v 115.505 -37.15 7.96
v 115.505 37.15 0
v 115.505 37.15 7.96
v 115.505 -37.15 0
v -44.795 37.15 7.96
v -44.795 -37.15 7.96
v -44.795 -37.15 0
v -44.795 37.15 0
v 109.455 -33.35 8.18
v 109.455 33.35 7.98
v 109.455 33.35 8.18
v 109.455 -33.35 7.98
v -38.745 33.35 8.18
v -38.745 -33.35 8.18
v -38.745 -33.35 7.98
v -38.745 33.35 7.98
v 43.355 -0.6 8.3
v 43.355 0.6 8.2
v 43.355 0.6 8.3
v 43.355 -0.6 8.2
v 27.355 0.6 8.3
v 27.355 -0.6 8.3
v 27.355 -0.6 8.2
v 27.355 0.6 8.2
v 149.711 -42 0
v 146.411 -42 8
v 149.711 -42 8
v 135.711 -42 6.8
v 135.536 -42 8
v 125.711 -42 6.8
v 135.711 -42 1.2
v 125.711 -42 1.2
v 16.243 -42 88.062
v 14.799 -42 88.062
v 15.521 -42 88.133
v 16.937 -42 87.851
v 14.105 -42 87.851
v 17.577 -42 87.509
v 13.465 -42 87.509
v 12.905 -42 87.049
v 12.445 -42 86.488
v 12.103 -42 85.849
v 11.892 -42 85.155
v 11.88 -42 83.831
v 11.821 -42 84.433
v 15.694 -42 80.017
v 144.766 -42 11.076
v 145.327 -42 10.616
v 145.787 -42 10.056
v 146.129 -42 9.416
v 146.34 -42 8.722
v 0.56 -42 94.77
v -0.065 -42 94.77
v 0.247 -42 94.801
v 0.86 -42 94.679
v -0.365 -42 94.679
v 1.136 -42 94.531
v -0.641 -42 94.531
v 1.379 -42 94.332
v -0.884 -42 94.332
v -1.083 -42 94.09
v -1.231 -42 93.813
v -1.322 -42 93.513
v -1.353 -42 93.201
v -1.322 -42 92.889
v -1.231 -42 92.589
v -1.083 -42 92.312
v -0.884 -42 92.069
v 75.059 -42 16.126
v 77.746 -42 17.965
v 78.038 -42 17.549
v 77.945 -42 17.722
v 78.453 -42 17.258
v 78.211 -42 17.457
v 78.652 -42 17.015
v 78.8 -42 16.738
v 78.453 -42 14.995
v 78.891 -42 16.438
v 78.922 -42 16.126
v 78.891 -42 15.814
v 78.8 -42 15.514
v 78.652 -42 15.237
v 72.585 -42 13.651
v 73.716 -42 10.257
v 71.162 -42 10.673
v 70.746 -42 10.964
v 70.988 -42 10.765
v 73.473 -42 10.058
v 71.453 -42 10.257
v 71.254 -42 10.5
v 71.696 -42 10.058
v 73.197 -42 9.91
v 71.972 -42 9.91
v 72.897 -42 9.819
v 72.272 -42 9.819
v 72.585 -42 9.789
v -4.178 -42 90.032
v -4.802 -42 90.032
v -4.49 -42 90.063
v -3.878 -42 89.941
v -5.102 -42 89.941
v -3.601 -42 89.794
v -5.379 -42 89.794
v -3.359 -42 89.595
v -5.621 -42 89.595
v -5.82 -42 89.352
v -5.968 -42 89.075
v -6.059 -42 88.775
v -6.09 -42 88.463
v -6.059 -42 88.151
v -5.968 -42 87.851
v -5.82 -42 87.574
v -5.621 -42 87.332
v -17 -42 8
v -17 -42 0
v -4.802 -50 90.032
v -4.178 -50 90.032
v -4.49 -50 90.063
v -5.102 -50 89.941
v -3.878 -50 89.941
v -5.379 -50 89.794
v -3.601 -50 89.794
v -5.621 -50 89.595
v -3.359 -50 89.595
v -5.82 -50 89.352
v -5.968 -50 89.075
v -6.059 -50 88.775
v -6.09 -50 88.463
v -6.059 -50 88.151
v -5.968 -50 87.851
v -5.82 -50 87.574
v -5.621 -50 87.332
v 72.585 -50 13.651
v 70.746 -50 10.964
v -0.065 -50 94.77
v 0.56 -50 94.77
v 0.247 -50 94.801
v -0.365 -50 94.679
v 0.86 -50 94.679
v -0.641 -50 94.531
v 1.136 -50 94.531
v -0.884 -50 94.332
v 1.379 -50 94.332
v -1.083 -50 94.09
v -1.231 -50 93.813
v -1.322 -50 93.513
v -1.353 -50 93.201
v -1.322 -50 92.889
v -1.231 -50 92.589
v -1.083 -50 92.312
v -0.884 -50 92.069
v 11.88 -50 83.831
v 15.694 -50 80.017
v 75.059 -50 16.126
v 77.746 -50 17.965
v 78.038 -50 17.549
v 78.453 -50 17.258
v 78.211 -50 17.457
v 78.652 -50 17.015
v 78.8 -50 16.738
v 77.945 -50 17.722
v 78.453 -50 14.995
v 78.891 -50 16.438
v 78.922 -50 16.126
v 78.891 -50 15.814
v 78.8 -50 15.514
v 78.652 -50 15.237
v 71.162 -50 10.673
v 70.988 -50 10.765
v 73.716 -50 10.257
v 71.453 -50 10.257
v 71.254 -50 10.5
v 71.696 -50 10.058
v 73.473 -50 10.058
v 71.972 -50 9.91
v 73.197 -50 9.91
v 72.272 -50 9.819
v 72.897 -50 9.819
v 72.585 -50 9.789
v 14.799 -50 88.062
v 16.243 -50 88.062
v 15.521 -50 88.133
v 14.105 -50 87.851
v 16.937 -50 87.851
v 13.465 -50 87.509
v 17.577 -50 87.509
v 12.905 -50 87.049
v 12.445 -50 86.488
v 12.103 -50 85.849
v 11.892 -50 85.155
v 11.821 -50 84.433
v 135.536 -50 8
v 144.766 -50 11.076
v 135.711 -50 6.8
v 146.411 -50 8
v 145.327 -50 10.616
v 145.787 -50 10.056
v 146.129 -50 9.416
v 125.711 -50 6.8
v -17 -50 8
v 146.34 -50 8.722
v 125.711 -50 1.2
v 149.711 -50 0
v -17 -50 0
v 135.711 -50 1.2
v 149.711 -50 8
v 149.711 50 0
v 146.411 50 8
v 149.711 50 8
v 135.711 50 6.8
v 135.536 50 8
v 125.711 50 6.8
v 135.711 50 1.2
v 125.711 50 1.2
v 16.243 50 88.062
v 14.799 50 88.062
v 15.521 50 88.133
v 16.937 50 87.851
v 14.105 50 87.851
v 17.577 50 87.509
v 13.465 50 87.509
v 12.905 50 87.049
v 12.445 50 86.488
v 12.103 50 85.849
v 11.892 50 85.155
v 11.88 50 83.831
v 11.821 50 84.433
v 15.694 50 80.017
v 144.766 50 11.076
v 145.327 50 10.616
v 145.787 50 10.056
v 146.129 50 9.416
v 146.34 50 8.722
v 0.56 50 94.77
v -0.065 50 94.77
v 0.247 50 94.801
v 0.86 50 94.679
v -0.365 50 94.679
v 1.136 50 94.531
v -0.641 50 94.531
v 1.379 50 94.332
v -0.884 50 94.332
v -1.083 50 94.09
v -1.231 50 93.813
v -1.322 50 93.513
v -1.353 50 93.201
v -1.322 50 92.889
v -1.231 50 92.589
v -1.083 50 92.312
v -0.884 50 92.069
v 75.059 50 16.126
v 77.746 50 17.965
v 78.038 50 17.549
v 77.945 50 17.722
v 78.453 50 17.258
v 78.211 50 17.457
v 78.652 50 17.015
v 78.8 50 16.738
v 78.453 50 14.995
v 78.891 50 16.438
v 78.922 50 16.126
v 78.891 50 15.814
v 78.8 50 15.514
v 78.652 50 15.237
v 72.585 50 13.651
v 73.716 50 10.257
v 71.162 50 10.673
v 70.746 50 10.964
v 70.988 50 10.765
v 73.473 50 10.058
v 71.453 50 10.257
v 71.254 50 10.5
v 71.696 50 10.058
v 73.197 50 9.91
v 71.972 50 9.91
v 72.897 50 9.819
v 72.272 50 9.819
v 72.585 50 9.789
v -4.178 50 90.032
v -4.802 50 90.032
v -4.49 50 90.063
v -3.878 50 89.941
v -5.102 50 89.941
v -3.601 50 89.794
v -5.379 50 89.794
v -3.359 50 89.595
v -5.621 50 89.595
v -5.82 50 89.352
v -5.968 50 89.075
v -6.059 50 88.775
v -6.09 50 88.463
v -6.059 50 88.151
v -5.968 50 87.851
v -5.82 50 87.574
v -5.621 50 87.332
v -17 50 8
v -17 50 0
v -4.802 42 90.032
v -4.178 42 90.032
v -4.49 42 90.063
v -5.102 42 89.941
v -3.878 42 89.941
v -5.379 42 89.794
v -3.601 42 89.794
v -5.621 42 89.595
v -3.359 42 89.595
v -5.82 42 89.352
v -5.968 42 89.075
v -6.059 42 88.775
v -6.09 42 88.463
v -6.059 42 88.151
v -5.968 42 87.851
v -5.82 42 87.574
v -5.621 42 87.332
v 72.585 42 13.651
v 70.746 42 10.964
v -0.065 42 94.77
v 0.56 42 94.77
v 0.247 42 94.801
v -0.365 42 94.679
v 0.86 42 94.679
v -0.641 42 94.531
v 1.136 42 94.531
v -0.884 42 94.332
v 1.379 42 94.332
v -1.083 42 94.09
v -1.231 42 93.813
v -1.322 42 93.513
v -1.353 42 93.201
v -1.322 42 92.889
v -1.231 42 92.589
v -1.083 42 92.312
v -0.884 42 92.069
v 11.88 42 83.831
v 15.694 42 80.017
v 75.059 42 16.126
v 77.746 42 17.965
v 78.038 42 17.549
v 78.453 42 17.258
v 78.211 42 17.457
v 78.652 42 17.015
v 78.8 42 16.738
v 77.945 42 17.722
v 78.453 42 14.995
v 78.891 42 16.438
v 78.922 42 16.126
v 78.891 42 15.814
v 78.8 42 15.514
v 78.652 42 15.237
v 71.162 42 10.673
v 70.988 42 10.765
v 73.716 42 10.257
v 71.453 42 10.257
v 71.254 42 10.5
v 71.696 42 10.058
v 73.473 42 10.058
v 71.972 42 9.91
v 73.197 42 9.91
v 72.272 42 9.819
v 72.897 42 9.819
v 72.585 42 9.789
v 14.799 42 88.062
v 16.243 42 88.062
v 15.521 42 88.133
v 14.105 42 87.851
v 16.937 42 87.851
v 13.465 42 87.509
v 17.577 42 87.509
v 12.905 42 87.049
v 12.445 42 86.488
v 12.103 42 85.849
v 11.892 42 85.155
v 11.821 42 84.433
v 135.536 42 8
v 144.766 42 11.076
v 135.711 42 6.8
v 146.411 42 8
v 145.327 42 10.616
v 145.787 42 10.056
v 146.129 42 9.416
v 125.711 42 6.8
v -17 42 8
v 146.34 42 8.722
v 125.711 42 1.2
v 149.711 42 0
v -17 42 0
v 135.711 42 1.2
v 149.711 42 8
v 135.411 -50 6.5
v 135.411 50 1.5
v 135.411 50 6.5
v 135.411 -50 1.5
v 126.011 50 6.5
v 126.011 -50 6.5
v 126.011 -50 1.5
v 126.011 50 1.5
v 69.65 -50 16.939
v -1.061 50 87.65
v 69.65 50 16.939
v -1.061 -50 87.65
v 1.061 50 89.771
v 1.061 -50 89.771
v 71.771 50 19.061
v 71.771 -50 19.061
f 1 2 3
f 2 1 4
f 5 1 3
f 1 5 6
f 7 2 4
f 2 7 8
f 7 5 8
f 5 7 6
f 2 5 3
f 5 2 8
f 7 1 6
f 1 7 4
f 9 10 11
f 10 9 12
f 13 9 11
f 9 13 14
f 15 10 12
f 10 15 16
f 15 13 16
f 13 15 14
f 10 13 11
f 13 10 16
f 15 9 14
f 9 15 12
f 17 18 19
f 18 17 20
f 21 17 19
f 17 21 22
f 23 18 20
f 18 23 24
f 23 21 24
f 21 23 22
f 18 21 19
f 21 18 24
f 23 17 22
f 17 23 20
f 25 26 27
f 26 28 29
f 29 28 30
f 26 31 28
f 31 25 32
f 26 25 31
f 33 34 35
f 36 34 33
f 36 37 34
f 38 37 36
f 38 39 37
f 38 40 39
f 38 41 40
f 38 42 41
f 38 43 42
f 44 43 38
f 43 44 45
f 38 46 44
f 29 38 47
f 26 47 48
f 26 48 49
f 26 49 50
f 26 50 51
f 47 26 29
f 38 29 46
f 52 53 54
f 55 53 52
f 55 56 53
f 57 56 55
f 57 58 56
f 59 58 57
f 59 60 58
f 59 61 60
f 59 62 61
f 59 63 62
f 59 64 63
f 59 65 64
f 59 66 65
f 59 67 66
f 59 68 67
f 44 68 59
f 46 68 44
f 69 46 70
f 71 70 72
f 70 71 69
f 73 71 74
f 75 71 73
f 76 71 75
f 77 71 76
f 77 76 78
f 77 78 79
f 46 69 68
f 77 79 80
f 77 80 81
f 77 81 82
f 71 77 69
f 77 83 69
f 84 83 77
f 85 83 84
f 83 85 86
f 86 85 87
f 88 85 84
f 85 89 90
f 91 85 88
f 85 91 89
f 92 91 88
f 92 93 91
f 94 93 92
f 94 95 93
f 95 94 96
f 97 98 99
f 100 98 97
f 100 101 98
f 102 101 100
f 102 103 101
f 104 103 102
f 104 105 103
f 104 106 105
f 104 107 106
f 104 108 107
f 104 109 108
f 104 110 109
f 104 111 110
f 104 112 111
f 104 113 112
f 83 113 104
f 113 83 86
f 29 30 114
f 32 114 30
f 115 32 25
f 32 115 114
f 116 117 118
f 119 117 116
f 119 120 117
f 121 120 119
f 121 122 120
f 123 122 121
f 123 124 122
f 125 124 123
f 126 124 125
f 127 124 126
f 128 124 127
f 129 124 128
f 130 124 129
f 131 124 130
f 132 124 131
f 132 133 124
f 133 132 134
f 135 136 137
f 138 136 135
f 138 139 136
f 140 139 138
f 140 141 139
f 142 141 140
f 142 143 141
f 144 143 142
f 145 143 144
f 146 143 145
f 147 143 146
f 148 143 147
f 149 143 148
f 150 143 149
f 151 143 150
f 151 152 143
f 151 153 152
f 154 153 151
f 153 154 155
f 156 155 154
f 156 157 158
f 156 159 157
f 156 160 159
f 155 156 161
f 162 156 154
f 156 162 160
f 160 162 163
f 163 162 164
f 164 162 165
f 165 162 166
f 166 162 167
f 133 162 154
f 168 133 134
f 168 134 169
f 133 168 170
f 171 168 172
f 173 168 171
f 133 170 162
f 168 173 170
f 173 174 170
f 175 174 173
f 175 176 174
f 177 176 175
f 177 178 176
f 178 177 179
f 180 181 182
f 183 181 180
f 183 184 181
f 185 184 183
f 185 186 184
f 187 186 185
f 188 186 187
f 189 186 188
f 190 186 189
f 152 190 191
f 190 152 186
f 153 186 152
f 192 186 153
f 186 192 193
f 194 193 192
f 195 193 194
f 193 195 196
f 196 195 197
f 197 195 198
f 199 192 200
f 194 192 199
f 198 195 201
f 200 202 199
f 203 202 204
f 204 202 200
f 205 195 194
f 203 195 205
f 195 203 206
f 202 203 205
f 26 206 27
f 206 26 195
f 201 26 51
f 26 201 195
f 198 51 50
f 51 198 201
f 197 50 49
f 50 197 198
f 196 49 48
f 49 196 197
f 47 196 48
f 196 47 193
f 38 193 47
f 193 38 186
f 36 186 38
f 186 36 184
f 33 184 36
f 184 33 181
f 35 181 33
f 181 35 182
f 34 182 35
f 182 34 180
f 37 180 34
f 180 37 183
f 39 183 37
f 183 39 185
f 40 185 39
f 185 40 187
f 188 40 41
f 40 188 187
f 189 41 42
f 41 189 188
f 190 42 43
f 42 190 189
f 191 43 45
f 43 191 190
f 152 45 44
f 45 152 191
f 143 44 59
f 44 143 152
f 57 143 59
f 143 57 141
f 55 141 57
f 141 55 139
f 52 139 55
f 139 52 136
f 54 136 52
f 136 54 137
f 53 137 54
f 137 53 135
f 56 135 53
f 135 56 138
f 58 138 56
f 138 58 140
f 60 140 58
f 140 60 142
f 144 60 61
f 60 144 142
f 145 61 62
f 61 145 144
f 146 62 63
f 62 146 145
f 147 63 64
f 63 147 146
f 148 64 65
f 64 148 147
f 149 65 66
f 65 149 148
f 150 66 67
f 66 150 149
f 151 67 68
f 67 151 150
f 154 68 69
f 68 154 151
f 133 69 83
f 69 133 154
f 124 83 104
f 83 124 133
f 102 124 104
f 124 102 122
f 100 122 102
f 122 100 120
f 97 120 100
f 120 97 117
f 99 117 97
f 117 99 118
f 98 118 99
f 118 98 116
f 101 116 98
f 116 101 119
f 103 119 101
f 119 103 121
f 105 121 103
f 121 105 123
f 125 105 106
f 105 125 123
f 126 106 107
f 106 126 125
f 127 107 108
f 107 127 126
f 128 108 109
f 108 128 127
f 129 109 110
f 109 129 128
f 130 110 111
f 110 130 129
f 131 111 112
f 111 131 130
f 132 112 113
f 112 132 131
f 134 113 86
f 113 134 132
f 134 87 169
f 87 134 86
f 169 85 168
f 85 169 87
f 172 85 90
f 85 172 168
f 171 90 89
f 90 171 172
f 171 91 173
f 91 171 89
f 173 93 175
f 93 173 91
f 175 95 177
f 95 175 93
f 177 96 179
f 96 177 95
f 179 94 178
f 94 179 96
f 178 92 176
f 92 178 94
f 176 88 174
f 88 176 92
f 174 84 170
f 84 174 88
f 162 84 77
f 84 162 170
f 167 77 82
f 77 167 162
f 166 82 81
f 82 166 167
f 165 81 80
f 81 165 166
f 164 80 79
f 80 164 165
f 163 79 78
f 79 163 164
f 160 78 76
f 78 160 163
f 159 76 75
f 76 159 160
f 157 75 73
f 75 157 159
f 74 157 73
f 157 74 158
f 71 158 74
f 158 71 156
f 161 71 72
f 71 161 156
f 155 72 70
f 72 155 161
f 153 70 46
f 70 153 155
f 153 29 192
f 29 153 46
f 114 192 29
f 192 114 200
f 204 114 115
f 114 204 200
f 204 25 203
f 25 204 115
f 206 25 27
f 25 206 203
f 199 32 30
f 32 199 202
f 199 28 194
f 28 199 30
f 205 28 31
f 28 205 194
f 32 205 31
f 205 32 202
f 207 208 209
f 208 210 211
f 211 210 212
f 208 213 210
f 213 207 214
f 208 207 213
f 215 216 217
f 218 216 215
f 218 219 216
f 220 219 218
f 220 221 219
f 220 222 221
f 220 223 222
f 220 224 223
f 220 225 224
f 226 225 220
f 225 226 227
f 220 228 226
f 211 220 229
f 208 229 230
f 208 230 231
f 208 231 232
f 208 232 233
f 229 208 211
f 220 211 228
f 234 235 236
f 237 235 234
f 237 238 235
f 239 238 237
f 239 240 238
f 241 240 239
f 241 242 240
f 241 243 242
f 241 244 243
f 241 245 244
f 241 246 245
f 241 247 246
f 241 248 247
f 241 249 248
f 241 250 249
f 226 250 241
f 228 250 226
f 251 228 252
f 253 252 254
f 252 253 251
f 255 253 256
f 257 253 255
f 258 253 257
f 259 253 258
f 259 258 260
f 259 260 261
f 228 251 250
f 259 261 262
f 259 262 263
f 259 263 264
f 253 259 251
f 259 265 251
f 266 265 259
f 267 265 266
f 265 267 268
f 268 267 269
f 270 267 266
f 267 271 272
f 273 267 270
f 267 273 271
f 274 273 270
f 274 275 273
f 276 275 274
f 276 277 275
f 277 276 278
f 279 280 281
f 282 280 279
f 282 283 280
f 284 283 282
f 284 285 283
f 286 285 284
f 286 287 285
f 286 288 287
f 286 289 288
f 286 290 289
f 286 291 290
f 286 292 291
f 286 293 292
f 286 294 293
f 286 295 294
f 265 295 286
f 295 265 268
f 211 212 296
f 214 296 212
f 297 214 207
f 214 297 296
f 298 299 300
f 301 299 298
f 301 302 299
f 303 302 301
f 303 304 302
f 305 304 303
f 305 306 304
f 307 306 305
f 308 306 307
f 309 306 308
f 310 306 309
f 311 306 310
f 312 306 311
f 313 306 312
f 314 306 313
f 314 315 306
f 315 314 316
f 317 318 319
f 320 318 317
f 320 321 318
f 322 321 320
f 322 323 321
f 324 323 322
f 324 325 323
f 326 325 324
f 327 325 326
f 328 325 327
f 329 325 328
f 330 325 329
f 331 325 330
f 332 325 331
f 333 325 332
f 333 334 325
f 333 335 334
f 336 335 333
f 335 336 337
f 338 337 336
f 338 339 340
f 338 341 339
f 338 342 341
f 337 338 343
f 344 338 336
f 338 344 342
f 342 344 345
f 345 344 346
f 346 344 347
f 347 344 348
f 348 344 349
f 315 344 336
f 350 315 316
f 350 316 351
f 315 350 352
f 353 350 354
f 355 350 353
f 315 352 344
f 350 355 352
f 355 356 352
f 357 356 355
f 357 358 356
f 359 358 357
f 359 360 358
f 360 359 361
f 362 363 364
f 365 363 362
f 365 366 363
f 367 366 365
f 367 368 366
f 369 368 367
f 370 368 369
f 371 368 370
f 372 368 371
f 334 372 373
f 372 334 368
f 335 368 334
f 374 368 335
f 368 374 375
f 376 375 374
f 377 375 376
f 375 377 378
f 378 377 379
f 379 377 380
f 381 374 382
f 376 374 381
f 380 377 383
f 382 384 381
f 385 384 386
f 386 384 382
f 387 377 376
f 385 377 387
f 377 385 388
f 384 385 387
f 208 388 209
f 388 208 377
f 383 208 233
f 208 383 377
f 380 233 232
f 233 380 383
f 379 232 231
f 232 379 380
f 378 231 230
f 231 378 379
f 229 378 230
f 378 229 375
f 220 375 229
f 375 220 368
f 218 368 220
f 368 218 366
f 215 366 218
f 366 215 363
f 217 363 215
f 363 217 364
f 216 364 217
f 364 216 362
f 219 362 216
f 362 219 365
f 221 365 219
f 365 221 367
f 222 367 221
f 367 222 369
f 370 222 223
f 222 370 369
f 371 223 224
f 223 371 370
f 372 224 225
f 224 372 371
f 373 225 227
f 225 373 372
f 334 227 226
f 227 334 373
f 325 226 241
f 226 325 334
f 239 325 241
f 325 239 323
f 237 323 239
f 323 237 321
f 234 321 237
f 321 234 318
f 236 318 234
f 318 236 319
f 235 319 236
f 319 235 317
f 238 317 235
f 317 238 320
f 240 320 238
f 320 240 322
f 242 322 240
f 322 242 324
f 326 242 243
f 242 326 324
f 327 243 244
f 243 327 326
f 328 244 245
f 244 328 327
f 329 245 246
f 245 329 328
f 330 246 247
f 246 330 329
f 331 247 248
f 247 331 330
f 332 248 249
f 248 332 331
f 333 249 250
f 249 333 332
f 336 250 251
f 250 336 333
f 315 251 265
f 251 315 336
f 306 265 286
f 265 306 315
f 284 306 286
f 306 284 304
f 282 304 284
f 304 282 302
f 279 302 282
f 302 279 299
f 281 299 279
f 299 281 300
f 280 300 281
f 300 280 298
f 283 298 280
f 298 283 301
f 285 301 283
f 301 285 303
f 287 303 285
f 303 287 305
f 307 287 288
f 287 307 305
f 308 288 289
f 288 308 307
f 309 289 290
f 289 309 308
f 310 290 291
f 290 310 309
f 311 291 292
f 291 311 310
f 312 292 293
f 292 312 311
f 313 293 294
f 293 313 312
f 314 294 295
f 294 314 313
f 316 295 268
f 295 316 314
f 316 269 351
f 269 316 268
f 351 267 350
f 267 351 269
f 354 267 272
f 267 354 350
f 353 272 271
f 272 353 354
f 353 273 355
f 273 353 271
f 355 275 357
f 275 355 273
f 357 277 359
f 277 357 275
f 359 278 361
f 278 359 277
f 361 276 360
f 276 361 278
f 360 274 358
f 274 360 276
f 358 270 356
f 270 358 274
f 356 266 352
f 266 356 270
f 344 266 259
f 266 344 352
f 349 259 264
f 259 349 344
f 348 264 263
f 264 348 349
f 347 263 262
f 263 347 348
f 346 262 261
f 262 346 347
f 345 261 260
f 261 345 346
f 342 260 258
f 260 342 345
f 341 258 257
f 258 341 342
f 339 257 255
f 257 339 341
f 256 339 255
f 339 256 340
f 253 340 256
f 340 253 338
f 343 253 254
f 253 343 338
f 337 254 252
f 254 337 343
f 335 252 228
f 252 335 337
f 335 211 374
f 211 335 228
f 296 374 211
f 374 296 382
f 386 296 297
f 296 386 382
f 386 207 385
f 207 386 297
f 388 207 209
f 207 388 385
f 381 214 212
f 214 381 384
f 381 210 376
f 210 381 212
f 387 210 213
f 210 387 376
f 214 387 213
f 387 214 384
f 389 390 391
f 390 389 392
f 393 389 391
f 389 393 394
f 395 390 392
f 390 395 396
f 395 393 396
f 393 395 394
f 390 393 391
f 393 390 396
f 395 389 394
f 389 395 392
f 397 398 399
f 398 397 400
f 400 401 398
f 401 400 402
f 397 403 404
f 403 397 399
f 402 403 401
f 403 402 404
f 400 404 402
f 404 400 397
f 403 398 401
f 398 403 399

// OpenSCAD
/*
  HOLODESK Reno3 V0.2 — single 45-degree plate desktop optical MVP
  Units: mm. Parametric for 100x100 or 150x150 acrylic sheet.

  PRINTING:
  mode="print_bracket" -> print two matching brackets.
  mode="print_bar" -> print one crossbar.
  In assembly mode the sheet and Reno3 are for visualization only.
  Smartphone rests on the table, NOT in a clamping cradle.
  Changes from V0.1: 10 mm -> 18 mm plate lower-edge height;
  accurate Reno3 Vitality physical envelope and approximate 20:9 screen.
*/
mode = "assembly";       // "assembly", "print_bracket", "print_bar", "print_layout"
panel_size = 100;         // 100 or 150
panel_thickness = 3;     // adjust to actually measured material
slot_clearance = 0.5;    // total additional slot width, tune for printer
view_angle = 45;         // degrees from tabletop
plate_bottom_z = 18;     // V0.2 extra safety clearance above phone
show_phone = true;
show_plate = true;
phone_length = 160.3;    // OPPO Reno3 Vitality (元气版)
phone_width = 74.3;
phone_thickness = 7.96; // bare phone; add an actual measured case height if using case
phone_extra_height = 0;  // measured case/standoff contribution, if any
$fn=32;

// Shape dimensions. The phone is not supported by the frame.
slot = panel_thickness + slot_clearance;
wall = 3.2;
foot_height = 8;
foot_front = 17;
foot_back = 79;
bracket_width = 8;
rad=view_angle;
c=cos(rad);
s=sin(rad);
B=[panel_size*c,plate_bottom_z];
T=[0,plate_bottom_z+panel_size*s];
v=[-c,s];
n=[s,c];
bar_x=B[0]+55;
bar_hole_w=10;
bar_hole_z=1.2;
bar_hole_h=5.6;

// Physical checks are indicative; real-world print tolerances and camera bumps apply.
echo(str("Reno3 body ",phone_length," x ",phone_width," x ",phone_thickness," mm"));
echo(str("Estimated minimum plate-surface-to-phone-top gap: ", plate_bottom_z-panel_thickness/2*cos(view_angle)-(phone_thickness+phone_extra_height)," mm"));
echo(str("Lateral phone-to-bracket total free gap: ",panel_size-2*bracket_width-phone_width," mm"));

function add(a,b)=[a[0]+b[0],a[1]+b[1]];
function scale2(a,vv)=[a[0]*vv,a[1]*vv];
function shift(a,vector,length)=add(a,scale2(vector,length));
module capsule(a,b,r){hull(){translate(a)circle(r=r);translate(b)circle(r=r);}}
module bracket_profile(){
  difference(){
    union(){
      translate([-foot_front,0]) square([B[0]+foot_back+foot_front,foot_height]);
      for(side=[-1,1])
        capsule(shift(shift(B,v,-5),n,side*(slot/2+wall/2)),
                shift(shift(T,v, 3),n,side*(slot/2+wall/2)),wall/2);
      capsule(shift(shift(B,v,-6),n,-(slot/2+wall/2)),
              shift(shift(B,v,-6),n, (slot/2+wall/2)),wall/2);
      capsule(shift(shift(T,v,-14),n,slot/2+wall+3),
              [B[0]+foot_back-7,foot_height],3.7);
    }
    translate([bar_x,bar_hole_z])square([bar_hole_w,bar_hole_h]);
  }
}
module bracket_flat(){linear_extrude(height=bracket_width) bracket_profile();}
module bar_flat(){cube([9.4,panel_size,5.0]);}
module bracket_assembled(y_top){translate([0,y_top,0])rotate([90,0,0])bracket_flat();}
module bar_assembled(){translate([bar_x+0.3,-panel_size/2,1.5])bar_flat();}
module plate_assembled(){
  color([0.35,0.8,0.92,0.28])
    translate([B[0],-panel_size/2,plate_bottom_z])
      rotate([0,-(180-view_angle),0])
        translate([0,0,-panel_thickness/2])
          cube([panel_size,panel_size,panel_thickness]);
}
module phone_assembled(){
  // Black phone envelope; camera bump/case not modeled.
  cx=B[0]/2;
  color([0.12,0.13,0.15])
    translate([cx-phone_length/2,-phone_width/2,0])
      cube([phone_length,phone_width,phone_thickness+phone_extra_height]);
  // Approximate OLED active display dimensions from 6.4-inch, 20:9 spec.
  screen_long=148.2;
  screen_short=66.7;
  color([0.003,0.006,0.012])
    translate([cx-screen_long/2,-screen_short/2,phone_thickness+phone_extra_height+0.02])
      cube([screen_long,screen_short,0.20]);
  color([0.02,0.60,0.80])
    translate([cx-8,-0.6,phone_thickness+phone_extra_height+0.24])cube([16,1.2,0.1]);
}
if(mode=="print_bracket")bracket_flat();
else if(mode=="print_bar")bar_flat();
else if(mode=="print_layout"){
  bracket_flat();
  translate([B[0]+foot_back+40,0,0])bracket_flat();
  translate([0,panel_size+30,0])bar_flat();
}else{
  if(show_phone) phone_assembled();
  color([0.16,0.17,0.19]){
    bracket_assembled(-panel_size/2+bracket_width);
    bracket_assembled(panel_size/2);
    bar_assembled();
  }
  if(show_plate)plate_assembled();
}
